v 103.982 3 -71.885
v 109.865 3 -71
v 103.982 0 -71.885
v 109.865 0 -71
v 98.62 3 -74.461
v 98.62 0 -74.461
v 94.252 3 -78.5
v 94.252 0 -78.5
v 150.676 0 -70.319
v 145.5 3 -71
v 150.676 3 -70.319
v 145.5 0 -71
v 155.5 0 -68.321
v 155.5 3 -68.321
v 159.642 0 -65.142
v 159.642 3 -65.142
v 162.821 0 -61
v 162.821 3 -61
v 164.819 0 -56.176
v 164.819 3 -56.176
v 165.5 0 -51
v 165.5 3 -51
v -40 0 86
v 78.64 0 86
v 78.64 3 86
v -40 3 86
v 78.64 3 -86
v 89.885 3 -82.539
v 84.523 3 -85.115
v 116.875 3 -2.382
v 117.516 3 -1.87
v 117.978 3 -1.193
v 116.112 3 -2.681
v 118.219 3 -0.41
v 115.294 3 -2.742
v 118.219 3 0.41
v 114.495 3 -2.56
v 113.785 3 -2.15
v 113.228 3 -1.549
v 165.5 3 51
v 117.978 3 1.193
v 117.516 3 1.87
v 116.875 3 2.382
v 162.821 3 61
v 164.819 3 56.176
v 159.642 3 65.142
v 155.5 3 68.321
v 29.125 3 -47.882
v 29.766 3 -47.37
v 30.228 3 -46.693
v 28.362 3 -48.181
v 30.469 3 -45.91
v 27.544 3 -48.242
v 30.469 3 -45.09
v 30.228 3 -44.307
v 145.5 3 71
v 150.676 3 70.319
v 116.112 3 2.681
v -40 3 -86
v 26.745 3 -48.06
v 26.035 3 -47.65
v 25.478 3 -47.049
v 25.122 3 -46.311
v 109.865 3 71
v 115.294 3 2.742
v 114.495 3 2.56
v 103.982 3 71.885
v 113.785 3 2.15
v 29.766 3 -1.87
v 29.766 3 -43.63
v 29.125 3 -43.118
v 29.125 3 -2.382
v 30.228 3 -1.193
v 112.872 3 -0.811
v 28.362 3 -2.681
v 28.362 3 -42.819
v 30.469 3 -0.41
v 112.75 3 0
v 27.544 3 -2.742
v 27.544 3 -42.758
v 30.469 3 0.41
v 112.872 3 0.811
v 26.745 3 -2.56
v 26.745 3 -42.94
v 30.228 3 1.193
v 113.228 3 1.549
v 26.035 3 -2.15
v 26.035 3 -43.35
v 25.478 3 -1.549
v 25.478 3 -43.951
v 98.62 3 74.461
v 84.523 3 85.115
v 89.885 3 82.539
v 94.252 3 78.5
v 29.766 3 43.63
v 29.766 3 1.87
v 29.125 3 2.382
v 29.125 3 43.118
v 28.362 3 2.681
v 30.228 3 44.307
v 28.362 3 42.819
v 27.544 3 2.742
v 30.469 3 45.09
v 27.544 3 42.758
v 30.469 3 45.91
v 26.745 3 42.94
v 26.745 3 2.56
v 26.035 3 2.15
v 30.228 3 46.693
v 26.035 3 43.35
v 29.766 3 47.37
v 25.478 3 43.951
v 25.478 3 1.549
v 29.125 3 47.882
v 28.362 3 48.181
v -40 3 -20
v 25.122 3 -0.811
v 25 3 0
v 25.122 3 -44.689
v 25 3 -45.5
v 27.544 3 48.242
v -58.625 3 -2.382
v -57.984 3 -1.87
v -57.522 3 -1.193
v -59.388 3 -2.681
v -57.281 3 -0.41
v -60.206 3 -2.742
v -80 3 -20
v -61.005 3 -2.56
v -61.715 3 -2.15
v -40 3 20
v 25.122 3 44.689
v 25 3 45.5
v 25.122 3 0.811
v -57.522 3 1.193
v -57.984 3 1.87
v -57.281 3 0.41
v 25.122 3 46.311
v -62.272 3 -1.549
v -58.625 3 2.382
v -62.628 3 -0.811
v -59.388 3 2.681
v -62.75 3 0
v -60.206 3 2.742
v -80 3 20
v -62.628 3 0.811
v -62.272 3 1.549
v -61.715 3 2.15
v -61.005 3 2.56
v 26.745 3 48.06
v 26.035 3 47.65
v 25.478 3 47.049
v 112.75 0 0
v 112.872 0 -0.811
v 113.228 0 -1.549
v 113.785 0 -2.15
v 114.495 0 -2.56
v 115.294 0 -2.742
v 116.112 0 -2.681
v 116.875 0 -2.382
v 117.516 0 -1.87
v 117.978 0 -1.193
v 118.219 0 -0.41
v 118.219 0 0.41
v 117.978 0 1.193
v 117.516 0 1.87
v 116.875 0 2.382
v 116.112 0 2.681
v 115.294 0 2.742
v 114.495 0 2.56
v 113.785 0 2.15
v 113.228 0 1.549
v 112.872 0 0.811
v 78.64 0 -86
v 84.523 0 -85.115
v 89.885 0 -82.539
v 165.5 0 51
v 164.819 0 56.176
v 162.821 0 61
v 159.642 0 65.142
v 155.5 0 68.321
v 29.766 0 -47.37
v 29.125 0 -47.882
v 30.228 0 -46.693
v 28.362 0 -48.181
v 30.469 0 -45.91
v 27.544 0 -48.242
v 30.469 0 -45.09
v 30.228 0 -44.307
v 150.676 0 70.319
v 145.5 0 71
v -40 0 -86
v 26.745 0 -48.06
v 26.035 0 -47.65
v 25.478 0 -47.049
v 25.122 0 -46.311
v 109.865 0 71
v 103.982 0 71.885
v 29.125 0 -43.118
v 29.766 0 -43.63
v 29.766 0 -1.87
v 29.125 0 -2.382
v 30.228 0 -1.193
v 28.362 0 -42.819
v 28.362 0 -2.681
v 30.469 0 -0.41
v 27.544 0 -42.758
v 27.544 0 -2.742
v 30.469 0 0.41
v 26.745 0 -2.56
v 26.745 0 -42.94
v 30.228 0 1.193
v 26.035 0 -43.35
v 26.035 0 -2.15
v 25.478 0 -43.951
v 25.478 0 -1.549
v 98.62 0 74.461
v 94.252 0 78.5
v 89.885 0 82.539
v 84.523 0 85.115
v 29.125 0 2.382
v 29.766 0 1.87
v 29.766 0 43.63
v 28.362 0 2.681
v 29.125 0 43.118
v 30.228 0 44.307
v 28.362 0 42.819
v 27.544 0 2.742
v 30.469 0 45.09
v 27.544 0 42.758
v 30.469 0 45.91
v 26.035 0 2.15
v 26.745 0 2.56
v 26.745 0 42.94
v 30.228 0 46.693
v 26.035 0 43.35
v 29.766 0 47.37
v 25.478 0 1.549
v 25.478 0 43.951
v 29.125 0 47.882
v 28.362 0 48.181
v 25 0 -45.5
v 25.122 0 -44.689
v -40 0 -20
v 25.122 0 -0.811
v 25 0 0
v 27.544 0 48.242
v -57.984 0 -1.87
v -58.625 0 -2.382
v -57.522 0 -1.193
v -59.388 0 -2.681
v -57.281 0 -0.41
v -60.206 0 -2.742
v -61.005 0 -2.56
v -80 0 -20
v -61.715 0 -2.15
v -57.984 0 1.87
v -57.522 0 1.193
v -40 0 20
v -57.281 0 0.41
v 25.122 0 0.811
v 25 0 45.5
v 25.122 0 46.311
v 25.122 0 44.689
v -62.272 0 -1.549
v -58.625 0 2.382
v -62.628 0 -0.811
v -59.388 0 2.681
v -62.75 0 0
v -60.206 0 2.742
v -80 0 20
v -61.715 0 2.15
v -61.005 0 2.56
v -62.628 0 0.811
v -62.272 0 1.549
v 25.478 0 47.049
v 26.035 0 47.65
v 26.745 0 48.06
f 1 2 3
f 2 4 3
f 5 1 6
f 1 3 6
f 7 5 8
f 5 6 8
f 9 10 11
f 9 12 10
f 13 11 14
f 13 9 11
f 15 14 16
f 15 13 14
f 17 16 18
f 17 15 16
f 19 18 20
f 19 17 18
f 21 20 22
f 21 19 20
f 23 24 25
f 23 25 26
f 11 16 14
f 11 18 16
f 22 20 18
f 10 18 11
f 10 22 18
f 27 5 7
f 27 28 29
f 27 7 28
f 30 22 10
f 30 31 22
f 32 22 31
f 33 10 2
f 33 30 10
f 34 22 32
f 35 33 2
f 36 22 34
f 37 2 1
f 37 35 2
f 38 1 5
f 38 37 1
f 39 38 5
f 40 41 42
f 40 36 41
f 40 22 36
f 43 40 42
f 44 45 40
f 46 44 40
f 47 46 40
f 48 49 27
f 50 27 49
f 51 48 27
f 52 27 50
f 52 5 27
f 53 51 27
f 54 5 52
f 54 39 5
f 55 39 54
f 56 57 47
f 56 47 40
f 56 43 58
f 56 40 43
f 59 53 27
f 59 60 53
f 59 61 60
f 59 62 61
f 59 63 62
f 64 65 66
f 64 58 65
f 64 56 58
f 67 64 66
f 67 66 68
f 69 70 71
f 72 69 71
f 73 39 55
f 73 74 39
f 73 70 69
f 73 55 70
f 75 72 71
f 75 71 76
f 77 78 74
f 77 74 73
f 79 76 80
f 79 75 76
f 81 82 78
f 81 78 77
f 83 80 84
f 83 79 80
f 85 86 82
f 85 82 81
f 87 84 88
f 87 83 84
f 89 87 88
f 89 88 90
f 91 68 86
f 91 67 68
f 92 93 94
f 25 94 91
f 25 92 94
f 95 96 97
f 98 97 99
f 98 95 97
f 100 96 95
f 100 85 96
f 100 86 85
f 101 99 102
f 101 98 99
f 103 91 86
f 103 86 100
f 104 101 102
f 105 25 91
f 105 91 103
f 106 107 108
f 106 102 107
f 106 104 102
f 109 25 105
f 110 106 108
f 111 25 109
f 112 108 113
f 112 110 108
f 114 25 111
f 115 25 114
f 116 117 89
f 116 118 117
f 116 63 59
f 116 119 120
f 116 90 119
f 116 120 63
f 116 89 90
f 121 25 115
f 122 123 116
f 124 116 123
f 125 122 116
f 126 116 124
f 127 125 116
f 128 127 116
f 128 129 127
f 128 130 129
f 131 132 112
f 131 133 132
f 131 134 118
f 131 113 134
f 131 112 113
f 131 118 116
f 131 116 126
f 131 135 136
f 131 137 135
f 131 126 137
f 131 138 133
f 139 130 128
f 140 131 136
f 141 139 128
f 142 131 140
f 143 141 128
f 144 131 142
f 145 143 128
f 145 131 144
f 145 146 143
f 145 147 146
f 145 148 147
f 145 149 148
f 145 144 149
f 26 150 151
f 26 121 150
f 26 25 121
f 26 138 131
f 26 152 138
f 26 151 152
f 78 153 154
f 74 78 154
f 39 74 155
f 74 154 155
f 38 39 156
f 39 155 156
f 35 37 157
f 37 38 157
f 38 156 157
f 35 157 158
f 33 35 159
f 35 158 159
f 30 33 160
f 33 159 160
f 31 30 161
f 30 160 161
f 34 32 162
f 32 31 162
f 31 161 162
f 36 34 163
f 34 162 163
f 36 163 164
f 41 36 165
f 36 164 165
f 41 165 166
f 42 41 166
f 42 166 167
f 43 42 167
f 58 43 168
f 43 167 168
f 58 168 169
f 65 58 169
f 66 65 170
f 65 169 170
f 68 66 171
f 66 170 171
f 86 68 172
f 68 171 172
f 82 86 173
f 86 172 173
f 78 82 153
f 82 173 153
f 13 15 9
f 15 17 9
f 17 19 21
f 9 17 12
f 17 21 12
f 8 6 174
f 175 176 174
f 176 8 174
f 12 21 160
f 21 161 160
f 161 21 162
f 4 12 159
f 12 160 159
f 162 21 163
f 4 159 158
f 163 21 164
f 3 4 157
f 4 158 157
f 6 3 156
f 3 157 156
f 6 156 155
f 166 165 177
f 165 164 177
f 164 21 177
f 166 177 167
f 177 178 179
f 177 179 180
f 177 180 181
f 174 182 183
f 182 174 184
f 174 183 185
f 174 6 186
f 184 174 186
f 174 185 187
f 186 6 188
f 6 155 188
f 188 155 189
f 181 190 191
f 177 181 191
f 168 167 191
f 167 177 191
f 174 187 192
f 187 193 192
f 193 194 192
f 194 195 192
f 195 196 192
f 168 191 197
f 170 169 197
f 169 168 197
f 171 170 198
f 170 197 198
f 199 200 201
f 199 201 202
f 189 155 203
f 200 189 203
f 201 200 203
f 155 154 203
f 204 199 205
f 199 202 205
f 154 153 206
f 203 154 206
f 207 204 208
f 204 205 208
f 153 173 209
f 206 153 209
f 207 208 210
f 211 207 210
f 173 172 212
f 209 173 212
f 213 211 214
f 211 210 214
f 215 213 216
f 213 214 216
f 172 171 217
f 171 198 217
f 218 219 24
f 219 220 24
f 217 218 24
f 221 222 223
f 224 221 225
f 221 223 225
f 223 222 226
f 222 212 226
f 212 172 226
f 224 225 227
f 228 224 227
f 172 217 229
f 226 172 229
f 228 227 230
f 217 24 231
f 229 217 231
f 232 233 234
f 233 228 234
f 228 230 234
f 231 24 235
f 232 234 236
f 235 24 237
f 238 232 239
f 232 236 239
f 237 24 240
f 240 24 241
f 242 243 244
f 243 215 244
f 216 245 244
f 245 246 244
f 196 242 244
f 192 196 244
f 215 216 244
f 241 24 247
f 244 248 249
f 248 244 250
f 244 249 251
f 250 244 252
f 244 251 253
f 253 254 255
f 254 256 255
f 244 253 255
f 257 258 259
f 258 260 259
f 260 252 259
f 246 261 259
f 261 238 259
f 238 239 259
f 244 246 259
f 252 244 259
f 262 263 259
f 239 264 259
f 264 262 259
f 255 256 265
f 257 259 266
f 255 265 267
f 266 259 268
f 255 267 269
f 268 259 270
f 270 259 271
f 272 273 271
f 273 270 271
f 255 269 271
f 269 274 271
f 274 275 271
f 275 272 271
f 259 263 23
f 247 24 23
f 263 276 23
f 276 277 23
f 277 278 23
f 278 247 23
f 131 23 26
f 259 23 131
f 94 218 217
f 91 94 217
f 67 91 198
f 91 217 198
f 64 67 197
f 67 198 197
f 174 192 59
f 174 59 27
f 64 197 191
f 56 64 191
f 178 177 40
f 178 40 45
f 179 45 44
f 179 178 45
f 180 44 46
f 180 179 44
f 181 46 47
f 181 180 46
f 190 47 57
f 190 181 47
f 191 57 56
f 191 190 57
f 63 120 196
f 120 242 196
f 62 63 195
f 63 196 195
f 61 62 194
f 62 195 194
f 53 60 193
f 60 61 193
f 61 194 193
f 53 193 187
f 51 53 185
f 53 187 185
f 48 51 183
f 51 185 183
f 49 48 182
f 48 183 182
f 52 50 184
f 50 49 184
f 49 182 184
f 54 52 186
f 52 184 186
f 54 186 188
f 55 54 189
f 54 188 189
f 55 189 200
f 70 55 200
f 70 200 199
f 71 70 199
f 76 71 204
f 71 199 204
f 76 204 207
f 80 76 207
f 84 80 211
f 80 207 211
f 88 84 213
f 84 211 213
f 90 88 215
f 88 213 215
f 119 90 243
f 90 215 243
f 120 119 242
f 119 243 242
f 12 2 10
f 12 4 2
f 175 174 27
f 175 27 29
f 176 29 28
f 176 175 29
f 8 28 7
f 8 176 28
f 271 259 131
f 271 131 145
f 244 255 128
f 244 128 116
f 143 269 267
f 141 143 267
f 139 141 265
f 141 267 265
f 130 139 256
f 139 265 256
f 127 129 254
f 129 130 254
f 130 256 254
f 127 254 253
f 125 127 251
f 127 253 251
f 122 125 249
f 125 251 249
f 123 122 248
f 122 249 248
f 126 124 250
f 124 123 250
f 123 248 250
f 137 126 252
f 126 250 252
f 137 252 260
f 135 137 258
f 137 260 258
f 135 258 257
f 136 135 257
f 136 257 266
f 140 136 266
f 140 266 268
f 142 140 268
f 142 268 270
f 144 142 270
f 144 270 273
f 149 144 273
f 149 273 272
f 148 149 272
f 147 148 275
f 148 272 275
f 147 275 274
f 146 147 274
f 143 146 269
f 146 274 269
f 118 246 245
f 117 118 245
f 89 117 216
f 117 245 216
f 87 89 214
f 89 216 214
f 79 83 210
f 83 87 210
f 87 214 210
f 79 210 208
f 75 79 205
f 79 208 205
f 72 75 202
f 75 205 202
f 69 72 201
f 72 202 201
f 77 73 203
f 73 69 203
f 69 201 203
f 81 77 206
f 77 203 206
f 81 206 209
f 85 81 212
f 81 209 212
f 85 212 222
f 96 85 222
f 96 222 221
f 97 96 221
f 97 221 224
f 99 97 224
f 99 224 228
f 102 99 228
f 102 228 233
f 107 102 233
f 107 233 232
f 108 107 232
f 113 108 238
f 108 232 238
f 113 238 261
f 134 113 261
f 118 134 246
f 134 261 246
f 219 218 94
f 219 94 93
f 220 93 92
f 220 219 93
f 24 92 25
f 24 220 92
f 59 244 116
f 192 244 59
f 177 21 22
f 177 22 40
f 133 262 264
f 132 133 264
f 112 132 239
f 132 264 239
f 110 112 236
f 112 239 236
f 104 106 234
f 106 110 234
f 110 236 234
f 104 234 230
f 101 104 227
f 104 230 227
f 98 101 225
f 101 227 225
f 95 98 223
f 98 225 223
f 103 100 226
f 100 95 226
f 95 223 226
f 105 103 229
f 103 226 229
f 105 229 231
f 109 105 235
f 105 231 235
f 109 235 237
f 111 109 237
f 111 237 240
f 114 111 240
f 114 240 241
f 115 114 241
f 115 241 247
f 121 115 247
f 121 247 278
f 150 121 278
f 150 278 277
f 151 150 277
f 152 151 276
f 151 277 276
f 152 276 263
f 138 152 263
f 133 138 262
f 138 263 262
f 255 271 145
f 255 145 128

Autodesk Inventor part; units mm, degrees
ref_plane "YZ Plane" through (0, 0, 0) normal (1, 0, 0) x (0, 1, 0)
ref_plane "XZ Plane" through (0, 0, 0) normal (0, 1, 0) x (-1, 0, 0)
ref_plane "XY Plane" through (0, 0, 0) normal (0, 0, 1) x (1, 0, 0)
sketch "Sketch1" plane through (0, 0, 0) normal (0, 1, 0) x (-1, 0, 0)
  line L0 (40, 20) -> (80, 20)
  line L1 (80, 20) -> (80, -20)
  line L2 (80, -20) -> (40, -20)
  line L3 (40, -20) -> (40, 20)
  circle A0 centre (60, 0) radius 2.75
  line L4 (40, -86) -> (-165.5, -86)
  line L5 (-165.5, -86) -> (-165.5, 86)
  line L6 (-165.5, 86) -> (40, 86)
  line L7 (40, 86) -> (40, -86)
  line L8 (-165.5, -86) -> (-90.5, -86)
  line L9 (-90.5, -86) -> (-90.5, -71)
  line L10 (-90.5, -71) -> (-165.5, -71)
  line L11 (-165.5, -71) -> (-165.5, -86)
  line L12 (-165.5, 86) -> (-90.5, 86)
  line L13 (-90.5, 86) -> (-90.5, 71)
  line L14 (-90.5, 71) -> (-165.5, 71)
  line L15 (-165.5, 71) -> (-165.5, 86)
  circle A1 centre (-27.75, 0) radius 2.75
  circle A2 centre (-27.75, 45.5) radius 2.75
  circle A3 centre (-27.75, -45.5) radius 2.75
  circle A4 centre (-115.5, 0) radius 2.75
  point P0 (-165.5, 0)
  dimension "d0" = 40
  dimension "d1" = 40
  dimension "d7" = 5.5
  dimension "d24" = 75
  dimension "d25" = 15
  dimension "d26" = 75
  dimension "d27" = 15
  dimension "d29" = 5.5
  dimension "d30" = 5.5
  dimension "d31" = 5.5
  dimension "d32" = 5.5
extrude "Extrusion1" add sketch "Sketch1" along normal blind 3 contours L0 L1 L2 L3 | L3 L7 L4 L9 L10 L5 L14 L13 L6
fillet "Fillet6" radius 20 6 edges at (90.5, 1.5, 86) (90.5, 1.5, 71) (165.5, 1.5, 71) (90.5, 1.5, -86) (90.5, 1.5, -71) (165.5, 1.5, -71)
properties part number "Chassis Front Plate"
